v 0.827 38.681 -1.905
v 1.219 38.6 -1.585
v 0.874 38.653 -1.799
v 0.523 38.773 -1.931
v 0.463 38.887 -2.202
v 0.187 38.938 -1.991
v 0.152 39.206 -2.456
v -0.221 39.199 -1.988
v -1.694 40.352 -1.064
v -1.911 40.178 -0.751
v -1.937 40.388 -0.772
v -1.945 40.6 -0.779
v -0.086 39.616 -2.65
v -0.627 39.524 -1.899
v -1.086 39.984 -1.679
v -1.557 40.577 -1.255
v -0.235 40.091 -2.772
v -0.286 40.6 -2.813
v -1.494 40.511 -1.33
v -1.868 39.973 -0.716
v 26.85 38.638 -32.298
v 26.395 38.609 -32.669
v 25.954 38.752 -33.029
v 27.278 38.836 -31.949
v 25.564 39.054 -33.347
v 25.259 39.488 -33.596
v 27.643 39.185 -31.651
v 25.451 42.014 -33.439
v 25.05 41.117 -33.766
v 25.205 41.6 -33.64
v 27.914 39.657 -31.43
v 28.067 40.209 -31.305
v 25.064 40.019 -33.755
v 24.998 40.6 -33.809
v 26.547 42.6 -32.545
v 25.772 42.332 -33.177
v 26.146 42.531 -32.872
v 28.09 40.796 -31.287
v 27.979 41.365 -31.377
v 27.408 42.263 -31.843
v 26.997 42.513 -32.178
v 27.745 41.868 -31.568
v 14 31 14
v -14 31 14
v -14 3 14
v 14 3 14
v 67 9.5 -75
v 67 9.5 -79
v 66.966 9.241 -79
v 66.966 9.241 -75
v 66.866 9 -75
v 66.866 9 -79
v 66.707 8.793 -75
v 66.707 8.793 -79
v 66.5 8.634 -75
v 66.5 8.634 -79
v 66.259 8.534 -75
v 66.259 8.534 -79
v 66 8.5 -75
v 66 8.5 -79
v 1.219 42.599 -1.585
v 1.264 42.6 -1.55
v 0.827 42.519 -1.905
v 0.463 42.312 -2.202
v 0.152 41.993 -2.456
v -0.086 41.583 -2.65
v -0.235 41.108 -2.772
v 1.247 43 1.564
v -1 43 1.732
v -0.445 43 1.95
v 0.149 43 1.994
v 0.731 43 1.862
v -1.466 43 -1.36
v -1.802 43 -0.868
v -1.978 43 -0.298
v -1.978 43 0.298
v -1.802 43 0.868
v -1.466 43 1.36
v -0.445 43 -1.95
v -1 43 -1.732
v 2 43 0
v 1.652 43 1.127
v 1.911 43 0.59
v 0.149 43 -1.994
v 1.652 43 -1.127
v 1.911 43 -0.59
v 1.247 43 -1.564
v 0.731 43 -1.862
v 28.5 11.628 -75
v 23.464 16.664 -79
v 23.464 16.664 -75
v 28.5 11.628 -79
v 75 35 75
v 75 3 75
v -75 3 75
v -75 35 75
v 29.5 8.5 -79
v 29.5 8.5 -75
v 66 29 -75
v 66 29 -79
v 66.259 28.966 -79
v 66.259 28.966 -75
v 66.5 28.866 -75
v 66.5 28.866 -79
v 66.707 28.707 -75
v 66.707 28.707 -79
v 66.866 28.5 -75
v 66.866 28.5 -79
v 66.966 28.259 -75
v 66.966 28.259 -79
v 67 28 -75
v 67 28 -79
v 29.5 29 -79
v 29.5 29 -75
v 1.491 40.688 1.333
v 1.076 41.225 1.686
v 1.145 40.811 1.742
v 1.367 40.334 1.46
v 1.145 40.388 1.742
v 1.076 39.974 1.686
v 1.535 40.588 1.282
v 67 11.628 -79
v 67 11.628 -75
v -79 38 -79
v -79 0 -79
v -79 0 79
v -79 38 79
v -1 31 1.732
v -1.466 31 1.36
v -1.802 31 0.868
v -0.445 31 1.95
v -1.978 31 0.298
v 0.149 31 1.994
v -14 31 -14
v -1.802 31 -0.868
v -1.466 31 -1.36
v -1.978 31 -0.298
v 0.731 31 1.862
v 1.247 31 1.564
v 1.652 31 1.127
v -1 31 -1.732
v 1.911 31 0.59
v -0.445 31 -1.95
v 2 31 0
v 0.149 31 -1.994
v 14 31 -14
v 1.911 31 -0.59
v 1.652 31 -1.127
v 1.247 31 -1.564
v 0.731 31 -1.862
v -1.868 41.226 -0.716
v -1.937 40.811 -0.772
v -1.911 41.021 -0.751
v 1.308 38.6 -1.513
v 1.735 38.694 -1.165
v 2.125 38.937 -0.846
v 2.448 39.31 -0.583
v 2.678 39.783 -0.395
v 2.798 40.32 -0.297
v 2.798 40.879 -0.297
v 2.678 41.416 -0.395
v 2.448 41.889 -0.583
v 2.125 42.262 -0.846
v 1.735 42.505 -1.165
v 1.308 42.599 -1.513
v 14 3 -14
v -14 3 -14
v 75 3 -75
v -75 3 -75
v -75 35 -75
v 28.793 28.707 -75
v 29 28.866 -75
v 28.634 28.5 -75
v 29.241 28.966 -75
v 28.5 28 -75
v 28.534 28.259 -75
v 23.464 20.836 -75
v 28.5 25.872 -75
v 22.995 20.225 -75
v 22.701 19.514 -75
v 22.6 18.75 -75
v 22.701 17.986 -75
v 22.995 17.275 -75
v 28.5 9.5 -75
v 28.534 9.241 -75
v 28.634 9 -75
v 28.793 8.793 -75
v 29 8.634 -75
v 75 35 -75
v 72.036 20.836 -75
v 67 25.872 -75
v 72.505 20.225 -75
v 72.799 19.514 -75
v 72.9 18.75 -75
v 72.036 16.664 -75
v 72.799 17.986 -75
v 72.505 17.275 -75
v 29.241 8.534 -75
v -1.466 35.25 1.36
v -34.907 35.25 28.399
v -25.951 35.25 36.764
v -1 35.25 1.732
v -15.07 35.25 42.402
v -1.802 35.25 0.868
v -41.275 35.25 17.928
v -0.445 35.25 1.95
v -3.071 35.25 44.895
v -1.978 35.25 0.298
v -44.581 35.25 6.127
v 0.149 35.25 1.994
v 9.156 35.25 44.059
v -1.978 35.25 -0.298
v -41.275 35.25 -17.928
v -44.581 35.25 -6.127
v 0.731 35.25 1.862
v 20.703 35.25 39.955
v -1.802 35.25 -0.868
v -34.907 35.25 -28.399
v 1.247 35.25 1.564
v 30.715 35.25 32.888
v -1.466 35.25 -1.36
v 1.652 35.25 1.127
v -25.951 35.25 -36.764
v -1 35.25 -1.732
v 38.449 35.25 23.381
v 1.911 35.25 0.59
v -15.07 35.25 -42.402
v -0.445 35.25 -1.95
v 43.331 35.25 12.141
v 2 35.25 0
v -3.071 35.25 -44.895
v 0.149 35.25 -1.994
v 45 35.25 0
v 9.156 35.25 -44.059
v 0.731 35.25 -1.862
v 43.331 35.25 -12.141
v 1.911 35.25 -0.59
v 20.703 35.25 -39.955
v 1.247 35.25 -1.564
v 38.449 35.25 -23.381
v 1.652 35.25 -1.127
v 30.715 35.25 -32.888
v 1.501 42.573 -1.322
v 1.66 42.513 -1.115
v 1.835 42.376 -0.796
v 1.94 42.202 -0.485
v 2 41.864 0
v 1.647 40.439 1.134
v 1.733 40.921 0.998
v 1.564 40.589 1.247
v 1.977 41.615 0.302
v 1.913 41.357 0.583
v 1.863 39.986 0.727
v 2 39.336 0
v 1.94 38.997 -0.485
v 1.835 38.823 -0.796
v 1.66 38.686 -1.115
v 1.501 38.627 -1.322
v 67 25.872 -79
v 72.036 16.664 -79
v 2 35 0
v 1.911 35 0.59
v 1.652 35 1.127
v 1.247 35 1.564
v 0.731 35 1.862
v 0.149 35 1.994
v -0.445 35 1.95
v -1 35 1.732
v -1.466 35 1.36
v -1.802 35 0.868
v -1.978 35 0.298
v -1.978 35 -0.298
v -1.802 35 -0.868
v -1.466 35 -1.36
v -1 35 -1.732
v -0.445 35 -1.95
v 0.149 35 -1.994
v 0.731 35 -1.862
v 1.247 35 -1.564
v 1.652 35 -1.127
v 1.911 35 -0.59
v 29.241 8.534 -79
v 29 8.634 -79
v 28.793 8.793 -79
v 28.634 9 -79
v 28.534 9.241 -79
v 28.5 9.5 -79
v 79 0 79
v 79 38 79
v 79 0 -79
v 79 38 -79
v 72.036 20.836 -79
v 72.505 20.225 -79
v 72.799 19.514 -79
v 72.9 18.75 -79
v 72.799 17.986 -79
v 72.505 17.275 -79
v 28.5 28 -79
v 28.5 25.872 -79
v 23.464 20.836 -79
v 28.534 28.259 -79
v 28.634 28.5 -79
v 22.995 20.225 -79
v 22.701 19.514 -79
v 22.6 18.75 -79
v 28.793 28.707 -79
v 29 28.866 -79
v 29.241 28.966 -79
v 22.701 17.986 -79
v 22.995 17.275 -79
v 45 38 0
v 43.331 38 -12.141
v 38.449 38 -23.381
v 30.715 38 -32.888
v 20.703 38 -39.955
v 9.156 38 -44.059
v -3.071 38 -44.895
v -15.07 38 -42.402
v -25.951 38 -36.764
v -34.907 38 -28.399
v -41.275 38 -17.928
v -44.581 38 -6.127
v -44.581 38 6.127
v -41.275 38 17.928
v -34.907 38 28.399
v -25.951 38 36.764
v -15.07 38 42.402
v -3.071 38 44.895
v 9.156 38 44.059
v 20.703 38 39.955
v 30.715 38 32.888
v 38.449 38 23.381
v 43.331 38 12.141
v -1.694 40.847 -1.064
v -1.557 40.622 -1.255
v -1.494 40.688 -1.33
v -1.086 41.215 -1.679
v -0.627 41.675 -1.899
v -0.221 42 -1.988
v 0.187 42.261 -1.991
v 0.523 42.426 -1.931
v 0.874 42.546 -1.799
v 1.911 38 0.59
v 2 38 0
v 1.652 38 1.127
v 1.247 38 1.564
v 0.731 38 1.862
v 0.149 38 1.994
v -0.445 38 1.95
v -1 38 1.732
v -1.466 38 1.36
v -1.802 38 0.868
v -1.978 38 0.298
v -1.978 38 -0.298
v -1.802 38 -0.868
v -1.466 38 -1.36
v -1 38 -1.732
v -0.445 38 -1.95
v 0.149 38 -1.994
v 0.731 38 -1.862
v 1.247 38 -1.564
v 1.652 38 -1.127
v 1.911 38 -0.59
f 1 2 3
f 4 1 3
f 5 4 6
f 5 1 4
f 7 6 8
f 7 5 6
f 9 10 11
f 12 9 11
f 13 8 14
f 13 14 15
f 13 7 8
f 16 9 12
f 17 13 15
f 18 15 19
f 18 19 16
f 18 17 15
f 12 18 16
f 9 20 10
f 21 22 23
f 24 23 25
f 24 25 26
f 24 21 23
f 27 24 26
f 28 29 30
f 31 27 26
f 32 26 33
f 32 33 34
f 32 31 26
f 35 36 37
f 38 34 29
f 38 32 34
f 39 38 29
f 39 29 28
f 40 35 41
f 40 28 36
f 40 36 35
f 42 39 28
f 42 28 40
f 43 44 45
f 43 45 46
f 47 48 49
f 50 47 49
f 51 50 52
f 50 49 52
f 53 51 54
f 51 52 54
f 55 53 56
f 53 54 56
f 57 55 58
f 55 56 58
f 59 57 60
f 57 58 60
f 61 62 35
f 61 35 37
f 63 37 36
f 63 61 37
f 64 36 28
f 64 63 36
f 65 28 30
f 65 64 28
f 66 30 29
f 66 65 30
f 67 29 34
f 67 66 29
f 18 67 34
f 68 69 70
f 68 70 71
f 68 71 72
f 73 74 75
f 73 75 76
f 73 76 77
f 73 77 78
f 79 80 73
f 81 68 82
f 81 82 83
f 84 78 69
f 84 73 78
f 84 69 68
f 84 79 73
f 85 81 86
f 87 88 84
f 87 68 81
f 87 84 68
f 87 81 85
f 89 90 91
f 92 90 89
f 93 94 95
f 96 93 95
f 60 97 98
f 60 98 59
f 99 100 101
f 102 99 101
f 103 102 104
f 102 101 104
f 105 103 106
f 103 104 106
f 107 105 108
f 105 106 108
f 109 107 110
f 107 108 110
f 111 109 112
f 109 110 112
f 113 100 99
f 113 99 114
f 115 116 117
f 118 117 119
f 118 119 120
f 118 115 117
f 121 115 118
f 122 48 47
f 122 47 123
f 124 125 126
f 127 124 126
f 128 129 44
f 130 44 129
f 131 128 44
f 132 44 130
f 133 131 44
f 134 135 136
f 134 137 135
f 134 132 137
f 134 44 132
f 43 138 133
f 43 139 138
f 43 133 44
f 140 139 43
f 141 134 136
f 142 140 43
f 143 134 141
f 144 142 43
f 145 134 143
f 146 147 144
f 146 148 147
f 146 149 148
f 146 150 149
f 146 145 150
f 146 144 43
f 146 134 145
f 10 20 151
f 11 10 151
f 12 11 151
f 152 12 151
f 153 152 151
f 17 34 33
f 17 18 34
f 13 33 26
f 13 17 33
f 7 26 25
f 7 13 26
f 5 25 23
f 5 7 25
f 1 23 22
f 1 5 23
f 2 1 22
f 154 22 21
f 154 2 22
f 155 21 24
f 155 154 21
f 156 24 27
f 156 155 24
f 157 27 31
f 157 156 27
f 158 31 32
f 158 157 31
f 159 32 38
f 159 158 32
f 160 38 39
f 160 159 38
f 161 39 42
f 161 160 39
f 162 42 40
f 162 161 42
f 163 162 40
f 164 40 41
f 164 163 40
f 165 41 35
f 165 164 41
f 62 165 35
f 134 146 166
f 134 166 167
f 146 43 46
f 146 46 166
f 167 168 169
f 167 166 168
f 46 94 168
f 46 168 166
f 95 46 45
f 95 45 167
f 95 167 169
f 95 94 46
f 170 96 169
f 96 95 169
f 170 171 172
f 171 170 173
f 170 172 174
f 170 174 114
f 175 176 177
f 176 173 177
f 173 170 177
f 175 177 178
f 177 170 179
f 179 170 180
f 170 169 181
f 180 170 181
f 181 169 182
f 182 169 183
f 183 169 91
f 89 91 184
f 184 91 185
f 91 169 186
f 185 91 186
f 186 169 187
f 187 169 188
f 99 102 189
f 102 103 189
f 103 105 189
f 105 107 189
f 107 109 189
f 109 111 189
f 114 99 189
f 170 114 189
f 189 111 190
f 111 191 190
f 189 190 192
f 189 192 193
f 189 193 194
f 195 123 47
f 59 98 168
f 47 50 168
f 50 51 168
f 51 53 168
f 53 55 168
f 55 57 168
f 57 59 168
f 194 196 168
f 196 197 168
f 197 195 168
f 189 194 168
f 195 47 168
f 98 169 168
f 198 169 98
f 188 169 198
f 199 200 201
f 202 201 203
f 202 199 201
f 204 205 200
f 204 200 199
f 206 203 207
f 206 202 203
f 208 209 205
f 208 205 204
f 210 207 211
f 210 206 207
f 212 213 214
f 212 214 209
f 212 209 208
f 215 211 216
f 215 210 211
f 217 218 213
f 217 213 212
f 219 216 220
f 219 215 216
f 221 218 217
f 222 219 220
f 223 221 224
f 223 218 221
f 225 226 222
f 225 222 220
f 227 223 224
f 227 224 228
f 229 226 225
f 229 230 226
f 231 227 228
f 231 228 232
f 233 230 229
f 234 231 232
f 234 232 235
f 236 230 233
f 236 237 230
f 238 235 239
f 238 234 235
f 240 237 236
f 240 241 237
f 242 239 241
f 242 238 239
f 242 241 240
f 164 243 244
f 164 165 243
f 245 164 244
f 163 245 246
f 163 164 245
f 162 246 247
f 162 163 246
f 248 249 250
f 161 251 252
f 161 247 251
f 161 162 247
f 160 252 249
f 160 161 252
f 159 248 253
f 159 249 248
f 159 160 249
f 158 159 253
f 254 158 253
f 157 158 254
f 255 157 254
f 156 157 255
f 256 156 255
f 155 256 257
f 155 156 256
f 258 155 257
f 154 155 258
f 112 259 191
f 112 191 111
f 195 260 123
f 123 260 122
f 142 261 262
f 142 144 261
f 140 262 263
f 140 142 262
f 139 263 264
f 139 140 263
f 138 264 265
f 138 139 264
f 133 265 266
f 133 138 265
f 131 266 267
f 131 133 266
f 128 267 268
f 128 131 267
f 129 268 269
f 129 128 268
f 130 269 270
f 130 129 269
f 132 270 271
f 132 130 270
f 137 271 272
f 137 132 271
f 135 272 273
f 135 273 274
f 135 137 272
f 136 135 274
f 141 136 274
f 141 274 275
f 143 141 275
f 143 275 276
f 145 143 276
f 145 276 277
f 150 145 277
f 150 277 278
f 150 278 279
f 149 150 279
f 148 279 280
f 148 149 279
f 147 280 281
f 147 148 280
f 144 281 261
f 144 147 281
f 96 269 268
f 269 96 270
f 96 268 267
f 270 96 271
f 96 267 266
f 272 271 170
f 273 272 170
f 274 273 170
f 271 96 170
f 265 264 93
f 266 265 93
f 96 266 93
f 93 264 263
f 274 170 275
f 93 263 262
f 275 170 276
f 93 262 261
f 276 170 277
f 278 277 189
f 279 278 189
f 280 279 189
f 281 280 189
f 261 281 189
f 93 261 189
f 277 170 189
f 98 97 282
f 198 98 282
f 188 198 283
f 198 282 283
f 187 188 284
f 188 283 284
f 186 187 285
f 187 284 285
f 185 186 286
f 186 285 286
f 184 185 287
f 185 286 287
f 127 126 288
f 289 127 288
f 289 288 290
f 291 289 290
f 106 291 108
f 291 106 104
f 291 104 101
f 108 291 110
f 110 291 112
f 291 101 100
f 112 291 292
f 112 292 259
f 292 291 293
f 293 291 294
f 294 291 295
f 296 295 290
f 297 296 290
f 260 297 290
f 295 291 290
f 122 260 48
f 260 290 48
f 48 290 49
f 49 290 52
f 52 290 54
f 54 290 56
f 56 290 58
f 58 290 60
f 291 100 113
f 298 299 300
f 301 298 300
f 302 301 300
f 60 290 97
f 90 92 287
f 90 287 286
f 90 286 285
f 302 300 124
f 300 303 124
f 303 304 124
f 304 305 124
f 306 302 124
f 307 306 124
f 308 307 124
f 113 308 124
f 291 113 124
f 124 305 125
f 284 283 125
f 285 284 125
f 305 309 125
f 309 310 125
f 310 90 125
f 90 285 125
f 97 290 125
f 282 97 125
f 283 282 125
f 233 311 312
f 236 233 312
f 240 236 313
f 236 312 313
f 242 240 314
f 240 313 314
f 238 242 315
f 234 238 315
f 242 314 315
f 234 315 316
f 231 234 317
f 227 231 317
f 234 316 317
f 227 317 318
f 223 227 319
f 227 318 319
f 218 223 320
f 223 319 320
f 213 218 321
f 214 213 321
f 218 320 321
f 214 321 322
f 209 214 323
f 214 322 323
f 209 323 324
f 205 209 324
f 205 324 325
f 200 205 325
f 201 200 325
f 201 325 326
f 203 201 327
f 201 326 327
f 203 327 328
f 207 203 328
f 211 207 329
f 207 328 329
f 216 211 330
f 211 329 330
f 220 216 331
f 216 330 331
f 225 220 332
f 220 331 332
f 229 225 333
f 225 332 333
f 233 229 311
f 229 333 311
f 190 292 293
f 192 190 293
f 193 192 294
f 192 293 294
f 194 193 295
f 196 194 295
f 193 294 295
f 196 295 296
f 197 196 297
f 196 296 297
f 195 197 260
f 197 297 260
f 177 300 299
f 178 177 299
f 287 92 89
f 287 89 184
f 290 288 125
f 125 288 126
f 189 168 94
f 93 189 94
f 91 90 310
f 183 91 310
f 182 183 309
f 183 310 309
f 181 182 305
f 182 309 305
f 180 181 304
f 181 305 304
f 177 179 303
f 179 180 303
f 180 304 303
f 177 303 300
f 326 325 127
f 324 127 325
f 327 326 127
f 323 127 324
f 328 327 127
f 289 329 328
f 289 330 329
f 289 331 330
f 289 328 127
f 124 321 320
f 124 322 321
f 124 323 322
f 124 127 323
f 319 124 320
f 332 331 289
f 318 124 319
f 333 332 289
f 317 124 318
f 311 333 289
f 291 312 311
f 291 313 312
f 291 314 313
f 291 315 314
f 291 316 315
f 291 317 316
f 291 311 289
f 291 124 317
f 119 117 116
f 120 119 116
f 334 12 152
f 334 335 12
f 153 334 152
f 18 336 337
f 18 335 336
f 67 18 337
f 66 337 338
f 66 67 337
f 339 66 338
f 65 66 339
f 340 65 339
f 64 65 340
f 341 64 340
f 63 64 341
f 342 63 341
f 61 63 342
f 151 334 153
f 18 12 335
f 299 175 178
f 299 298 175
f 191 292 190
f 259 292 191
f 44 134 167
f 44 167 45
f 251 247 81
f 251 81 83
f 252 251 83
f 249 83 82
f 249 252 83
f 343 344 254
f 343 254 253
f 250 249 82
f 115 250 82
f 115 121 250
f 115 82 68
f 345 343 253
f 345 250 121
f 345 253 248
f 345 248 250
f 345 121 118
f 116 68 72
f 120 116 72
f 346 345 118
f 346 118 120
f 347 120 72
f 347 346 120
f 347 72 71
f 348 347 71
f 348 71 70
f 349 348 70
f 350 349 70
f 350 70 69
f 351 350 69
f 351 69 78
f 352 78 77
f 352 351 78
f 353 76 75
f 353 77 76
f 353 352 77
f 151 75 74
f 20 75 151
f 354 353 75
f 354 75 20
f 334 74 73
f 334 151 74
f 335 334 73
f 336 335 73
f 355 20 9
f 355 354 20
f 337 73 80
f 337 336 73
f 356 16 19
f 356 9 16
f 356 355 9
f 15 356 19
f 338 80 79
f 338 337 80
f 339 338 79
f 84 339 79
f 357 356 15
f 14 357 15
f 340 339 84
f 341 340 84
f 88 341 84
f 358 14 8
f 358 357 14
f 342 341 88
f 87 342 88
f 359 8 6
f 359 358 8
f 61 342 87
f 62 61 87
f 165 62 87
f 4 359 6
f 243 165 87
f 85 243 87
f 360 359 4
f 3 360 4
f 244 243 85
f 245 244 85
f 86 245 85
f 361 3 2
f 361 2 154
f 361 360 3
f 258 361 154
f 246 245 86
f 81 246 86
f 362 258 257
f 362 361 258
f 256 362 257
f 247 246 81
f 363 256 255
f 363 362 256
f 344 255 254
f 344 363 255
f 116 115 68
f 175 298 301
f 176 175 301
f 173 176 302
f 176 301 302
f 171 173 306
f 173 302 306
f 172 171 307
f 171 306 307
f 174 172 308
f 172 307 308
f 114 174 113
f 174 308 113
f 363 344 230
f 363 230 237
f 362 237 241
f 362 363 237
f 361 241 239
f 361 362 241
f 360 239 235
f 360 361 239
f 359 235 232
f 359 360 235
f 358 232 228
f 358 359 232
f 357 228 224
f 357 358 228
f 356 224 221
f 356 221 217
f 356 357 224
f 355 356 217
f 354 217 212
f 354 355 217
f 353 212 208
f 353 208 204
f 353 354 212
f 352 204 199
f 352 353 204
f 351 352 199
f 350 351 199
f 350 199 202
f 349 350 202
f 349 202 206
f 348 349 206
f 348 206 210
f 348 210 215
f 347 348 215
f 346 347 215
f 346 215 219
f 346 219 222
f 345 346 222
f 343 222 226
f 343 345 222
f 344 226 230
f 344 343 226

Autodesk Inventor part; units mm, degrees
ref_plane "YZ Plane" through (0, 0, 0) normal (1, 0, 0) x (0, 1, 0)
ref_plane "XZ Plane" through (0, 0, 0) normal (0, 1, 0) x (-1, 0, 0)
sketch "Sketch1" plane through (0, 0, 0) normal (0, 1, 0) x (-1, 0, 0)
  line L0 (-75, 75) -> (75, 75)
  line L1 (75, 75) -> (75, -75)
  line L2 (75, -75) -> (-75, -75)
  line L3 (-75, -75) -> (-75, 75)
  line L4 (-75, 75) -> (75, -75) construction
  line L5 (75, 75) -> (-75, -75) construction
  line L6 (14, 14) -> (-14, 14)
  line L7 (-14, 14) -> (-14, -14)
  line L8 (-14, -14) -> (14, -14)
  line L9 (14, -14) -> (14, 14)
  line L10 (14, 14) -> (-14, -14) construction
  line L11 (-14, 14) -> (14, -14) construction
  circle A0 centre (0, 0) radius 35
  line L12 (-79, -79) -> (79, -79)
  line L13 (79, -79) -> (79, 79)
  line L14 (79, 79) -> (-79, 79)
  line L15 (-79, 79) -> (-79, -79)
  dimension "d0" = 150
  dimension "d1" = 150
  dimension "d2" = 28
  dimension "d3" = 28
  dimension "d4" = 70
  dimension "d7" = 4
extrude "Extrusion2" add sketch "Sketch1" along normal blind 35 contours L15 L14 L13 L12
extrude "Extrusion3" add sketch "Sketch1" along normal blind 3 contours L0 L1 L2 L3 | L9 L8 L7 L6 | A0
sketch "Sketch2" plane through (0, 3, 0) normal (0, 1, 0) x (1, 0, 0)
  line L0 (-14, -14) -> (14, -14)
  line L1 (14, -14) -> (14, 14)
  line L2 (14, 14) -> (-14, 14)
  line L3 (-14, 14) -> (-14, -14)
  line L4 (-14, -14) -> (14, 14) construction
  line L5 (14, -14) -> (-14, 14) construction
  point P0 (0, 0)
  dimension "d12" = 28
  dimension "d13" = 28
extrude "Extrusion4" add sketch "Sketch2" along normal blind 28
sketch "Sketch3" plane through (0, 31, 0) normal (0, 1, 0) x (1, 0, 0)
  circle A0 centre (0, 0) radius 2
  dimension "d16" = 4
extrude "Extrusion5" add sketch "Sketch3" along normal blind 12
sketch "Sketch4" plane through (0, 3, 0) normal (0, 1, 0) x (1, 0, 0)
  line L0 (-65, 72) -> (65, 72)
  line L1 (65, 72) -> (65, -18)
  line L2 (65, -18) -> (24, -18)
  line L3 (24, -18) -> (24, 24)
  line L4 (24, 24) -> (-24, 24)
  line L5 (-24, 24) -> (-24, -18)
  line L6 (-24, -18) -> (-65, -18)
  line L7 (-65, -18) -> (-65, 72)
  line L8 (-75, -75) -> (-75, 75) projected
  line L9 (75, 75) -> (75, -75) projected
  line L10 (-75, 75) -> (75, 75) projected
  line L11 (-14, 14) -> (14, 14) projected
  line L12 (-14, 14) -> (-14, -14) projected
  line L13 (14, 14) -> (14, -14) projected
  line L14 (39, -68) -> (65, -68)
  line L15 (65, -68) -> (65, -28)
  line L16 (65, -28) -> (39, -28)
  line L17 (39, -28) -> (39, -68)
  line L18 (-14, -14) -> (14, -14) projected
  point P0 (0, 0)
  point P1 (52, -28)
  point P2 (0, -14)
  dimension "d20" = 10
  dimension "d21" = 3
  dimension "d22" = 10
  dimension "d23" = 10
  dimension "d24" = 10
  dimension "d25" = 90
  dimension "d26" = 40
  dimension "d29" = 26
  dimension "d30" = 10
  dimension "d31" = 10
sketch "Sketch5" plane through (0, 31, 0) normal (0, 1, 0) x (1, 0, 0)
  circle A0 centre (0, 0) radius 45
  circle A1 centre (0, 0) radius 2.5714
  dimension "d32" = 90
sketch "Sketch6" plane through (0, 35, 0) normal (0, 1, 0) x (1, 0, 0)
  line L0 (79, 79) -> (-79, 79) projected
  line L1 (-79, 79) -> (-79, -79) projected
  line L2 (79, 79) -> (-79, 79)
  line L3 (-79, 79) -> (-79, -79)
  line L4 (-79, -79) -> (79, -79)
  line L5 (79, -79) -> (79, 79)
  point P0 (0, 0)
extrude "Extrusion6" add sketch "Sketch6" along normal blind 3
sketch "Sketch7" plane through (0, 38, 0) normal (0, 1, 0) x (1, 0, 0)
  circle A0 centre (0, 0) radius 2 projected
  circle A1 centre (0, 0) radius 45
  circle A2 centre (0, 0) radius 2.7692
  dimension "d42" = 90
extrude "Extrusion8" cut sketch "Sketch7" against normal blind 2.75 contours A1 | A2
ref_plane "Work Plane1" through (-14, 3, -14) normal (0.6321, 0, -0.7749) x (0, 1, 0)
sketch "Sketch8" plane through (-14, 3, -14) normal (0.6321, 0, -0.7749) x (0, 1, 0)
  circle A0 centre (37.5996, 19.6977) radius 2
  line L0 (32.25, 17.6977) -> (40, 17.6977) projected
  point P0 (-3, 19.6977)
extrude "Extrusion9" add sketch "Sketch8" along normal blind 40 and the other way blind 2.625
ref_plane "Work Plane2" through (0, 30.5, 0) normal (0, 1, 0) x (1, 0, 0)
sketch "Sketch9" plane through (0, 30.5, 0) normal (0, 1, 0) x (1, 0, 0)
  point P0 (0, 0)
sketch "Sketch10" plane through (79, 0, 79) normal (1, 0, 0) x (0, 0, -1)
  line L0 (8, 7.5) -> (46.5, 7.5)
  line L1 (46.5, 7.5) -> (46.5, 28)
  line L2 (46.5, 28) -> (8, 28)
  line L3 (8, 28) -> (8, 7.5)
  line L4 (0, 38) -> (158, 38) projected
  line L5 (0, 0) -> (0, 38) projected
  point P0 (79, 0)
  dimension "d50" = 38.5
  dimension "d51" = 20.5
  dimension "d52" = 10
  dimension "d53" = 8
sketch "Sketch11" plane through (79, 0, -79) normal (0, 0, -1) x (-1, 0, 0)
  line L0 (13, 29) -> (49.5, 29)
  line L1 (50.5, 28) -> (50.5, 9.5)
  line L2 (49.5, 8.5) -> (13, 8.5)
  line L3 (12, 9.5) -> (12, 28)
  circle A0 centre (9.05, 18.75) radius 2.95
  line L4 (6.964, 16.664) -> (12, 11.6281)
  line L5 (6.964, 20.836) -> (12, 25.8719)
  arc A1 (13, 29) -> (12, 28) centre (13, 28) ccw
  arc A2 (12, 9.5) -> (13, 8.5) centre (13, 9.5) ccw
  arc A3 (49.5, 8.5) -> (50.5, 9.5) centre (49.5, 9.5) ccw
  arc A4 (50.5, 28) -> (49.5, 29) centre (49.5, 28) ccw
  line L6 (0, 0) -> (0, 38) projected
  line L7 (0, 38) -> (158, 38) projected
  line L8 (55.536, 16.664) -> (50.5, 11.6281)
  circle A5 centre (53.45, 18.75) radius 2.95
  line L9 (55.536, 20.836) -> (50.5, 25.8719)
  point P0 (79, 0)
  point P1 (50.5, 8.5)
  point P2 (50.5, 29)
  point P3 (12, 8.5)
  point P4 (12, 18.75)
  point P5 (50.5, 18.75)
  dimension "d54" = 38.5
  dimension "d55" = 20.5
  dimension "d56" = 5.9
  dimension "d57" = 1
  dimension "d58" = 12
  dimension "d59" = 9
  dimension "d60" = 0
  dimension "d61" = 135
  dimension "d62" = 135
  dimension "d64" = 0
  dimension "d65" = 5.9
  dimension "d66" = 0
  dimension "d67" = 0
  dimension "d68" = 135
  dimension "d69" = 135
extrude "Extrusion10" cut sketch "Sketch11" against normal blind 19.75
properties part number "GPS-Compass-casing"
